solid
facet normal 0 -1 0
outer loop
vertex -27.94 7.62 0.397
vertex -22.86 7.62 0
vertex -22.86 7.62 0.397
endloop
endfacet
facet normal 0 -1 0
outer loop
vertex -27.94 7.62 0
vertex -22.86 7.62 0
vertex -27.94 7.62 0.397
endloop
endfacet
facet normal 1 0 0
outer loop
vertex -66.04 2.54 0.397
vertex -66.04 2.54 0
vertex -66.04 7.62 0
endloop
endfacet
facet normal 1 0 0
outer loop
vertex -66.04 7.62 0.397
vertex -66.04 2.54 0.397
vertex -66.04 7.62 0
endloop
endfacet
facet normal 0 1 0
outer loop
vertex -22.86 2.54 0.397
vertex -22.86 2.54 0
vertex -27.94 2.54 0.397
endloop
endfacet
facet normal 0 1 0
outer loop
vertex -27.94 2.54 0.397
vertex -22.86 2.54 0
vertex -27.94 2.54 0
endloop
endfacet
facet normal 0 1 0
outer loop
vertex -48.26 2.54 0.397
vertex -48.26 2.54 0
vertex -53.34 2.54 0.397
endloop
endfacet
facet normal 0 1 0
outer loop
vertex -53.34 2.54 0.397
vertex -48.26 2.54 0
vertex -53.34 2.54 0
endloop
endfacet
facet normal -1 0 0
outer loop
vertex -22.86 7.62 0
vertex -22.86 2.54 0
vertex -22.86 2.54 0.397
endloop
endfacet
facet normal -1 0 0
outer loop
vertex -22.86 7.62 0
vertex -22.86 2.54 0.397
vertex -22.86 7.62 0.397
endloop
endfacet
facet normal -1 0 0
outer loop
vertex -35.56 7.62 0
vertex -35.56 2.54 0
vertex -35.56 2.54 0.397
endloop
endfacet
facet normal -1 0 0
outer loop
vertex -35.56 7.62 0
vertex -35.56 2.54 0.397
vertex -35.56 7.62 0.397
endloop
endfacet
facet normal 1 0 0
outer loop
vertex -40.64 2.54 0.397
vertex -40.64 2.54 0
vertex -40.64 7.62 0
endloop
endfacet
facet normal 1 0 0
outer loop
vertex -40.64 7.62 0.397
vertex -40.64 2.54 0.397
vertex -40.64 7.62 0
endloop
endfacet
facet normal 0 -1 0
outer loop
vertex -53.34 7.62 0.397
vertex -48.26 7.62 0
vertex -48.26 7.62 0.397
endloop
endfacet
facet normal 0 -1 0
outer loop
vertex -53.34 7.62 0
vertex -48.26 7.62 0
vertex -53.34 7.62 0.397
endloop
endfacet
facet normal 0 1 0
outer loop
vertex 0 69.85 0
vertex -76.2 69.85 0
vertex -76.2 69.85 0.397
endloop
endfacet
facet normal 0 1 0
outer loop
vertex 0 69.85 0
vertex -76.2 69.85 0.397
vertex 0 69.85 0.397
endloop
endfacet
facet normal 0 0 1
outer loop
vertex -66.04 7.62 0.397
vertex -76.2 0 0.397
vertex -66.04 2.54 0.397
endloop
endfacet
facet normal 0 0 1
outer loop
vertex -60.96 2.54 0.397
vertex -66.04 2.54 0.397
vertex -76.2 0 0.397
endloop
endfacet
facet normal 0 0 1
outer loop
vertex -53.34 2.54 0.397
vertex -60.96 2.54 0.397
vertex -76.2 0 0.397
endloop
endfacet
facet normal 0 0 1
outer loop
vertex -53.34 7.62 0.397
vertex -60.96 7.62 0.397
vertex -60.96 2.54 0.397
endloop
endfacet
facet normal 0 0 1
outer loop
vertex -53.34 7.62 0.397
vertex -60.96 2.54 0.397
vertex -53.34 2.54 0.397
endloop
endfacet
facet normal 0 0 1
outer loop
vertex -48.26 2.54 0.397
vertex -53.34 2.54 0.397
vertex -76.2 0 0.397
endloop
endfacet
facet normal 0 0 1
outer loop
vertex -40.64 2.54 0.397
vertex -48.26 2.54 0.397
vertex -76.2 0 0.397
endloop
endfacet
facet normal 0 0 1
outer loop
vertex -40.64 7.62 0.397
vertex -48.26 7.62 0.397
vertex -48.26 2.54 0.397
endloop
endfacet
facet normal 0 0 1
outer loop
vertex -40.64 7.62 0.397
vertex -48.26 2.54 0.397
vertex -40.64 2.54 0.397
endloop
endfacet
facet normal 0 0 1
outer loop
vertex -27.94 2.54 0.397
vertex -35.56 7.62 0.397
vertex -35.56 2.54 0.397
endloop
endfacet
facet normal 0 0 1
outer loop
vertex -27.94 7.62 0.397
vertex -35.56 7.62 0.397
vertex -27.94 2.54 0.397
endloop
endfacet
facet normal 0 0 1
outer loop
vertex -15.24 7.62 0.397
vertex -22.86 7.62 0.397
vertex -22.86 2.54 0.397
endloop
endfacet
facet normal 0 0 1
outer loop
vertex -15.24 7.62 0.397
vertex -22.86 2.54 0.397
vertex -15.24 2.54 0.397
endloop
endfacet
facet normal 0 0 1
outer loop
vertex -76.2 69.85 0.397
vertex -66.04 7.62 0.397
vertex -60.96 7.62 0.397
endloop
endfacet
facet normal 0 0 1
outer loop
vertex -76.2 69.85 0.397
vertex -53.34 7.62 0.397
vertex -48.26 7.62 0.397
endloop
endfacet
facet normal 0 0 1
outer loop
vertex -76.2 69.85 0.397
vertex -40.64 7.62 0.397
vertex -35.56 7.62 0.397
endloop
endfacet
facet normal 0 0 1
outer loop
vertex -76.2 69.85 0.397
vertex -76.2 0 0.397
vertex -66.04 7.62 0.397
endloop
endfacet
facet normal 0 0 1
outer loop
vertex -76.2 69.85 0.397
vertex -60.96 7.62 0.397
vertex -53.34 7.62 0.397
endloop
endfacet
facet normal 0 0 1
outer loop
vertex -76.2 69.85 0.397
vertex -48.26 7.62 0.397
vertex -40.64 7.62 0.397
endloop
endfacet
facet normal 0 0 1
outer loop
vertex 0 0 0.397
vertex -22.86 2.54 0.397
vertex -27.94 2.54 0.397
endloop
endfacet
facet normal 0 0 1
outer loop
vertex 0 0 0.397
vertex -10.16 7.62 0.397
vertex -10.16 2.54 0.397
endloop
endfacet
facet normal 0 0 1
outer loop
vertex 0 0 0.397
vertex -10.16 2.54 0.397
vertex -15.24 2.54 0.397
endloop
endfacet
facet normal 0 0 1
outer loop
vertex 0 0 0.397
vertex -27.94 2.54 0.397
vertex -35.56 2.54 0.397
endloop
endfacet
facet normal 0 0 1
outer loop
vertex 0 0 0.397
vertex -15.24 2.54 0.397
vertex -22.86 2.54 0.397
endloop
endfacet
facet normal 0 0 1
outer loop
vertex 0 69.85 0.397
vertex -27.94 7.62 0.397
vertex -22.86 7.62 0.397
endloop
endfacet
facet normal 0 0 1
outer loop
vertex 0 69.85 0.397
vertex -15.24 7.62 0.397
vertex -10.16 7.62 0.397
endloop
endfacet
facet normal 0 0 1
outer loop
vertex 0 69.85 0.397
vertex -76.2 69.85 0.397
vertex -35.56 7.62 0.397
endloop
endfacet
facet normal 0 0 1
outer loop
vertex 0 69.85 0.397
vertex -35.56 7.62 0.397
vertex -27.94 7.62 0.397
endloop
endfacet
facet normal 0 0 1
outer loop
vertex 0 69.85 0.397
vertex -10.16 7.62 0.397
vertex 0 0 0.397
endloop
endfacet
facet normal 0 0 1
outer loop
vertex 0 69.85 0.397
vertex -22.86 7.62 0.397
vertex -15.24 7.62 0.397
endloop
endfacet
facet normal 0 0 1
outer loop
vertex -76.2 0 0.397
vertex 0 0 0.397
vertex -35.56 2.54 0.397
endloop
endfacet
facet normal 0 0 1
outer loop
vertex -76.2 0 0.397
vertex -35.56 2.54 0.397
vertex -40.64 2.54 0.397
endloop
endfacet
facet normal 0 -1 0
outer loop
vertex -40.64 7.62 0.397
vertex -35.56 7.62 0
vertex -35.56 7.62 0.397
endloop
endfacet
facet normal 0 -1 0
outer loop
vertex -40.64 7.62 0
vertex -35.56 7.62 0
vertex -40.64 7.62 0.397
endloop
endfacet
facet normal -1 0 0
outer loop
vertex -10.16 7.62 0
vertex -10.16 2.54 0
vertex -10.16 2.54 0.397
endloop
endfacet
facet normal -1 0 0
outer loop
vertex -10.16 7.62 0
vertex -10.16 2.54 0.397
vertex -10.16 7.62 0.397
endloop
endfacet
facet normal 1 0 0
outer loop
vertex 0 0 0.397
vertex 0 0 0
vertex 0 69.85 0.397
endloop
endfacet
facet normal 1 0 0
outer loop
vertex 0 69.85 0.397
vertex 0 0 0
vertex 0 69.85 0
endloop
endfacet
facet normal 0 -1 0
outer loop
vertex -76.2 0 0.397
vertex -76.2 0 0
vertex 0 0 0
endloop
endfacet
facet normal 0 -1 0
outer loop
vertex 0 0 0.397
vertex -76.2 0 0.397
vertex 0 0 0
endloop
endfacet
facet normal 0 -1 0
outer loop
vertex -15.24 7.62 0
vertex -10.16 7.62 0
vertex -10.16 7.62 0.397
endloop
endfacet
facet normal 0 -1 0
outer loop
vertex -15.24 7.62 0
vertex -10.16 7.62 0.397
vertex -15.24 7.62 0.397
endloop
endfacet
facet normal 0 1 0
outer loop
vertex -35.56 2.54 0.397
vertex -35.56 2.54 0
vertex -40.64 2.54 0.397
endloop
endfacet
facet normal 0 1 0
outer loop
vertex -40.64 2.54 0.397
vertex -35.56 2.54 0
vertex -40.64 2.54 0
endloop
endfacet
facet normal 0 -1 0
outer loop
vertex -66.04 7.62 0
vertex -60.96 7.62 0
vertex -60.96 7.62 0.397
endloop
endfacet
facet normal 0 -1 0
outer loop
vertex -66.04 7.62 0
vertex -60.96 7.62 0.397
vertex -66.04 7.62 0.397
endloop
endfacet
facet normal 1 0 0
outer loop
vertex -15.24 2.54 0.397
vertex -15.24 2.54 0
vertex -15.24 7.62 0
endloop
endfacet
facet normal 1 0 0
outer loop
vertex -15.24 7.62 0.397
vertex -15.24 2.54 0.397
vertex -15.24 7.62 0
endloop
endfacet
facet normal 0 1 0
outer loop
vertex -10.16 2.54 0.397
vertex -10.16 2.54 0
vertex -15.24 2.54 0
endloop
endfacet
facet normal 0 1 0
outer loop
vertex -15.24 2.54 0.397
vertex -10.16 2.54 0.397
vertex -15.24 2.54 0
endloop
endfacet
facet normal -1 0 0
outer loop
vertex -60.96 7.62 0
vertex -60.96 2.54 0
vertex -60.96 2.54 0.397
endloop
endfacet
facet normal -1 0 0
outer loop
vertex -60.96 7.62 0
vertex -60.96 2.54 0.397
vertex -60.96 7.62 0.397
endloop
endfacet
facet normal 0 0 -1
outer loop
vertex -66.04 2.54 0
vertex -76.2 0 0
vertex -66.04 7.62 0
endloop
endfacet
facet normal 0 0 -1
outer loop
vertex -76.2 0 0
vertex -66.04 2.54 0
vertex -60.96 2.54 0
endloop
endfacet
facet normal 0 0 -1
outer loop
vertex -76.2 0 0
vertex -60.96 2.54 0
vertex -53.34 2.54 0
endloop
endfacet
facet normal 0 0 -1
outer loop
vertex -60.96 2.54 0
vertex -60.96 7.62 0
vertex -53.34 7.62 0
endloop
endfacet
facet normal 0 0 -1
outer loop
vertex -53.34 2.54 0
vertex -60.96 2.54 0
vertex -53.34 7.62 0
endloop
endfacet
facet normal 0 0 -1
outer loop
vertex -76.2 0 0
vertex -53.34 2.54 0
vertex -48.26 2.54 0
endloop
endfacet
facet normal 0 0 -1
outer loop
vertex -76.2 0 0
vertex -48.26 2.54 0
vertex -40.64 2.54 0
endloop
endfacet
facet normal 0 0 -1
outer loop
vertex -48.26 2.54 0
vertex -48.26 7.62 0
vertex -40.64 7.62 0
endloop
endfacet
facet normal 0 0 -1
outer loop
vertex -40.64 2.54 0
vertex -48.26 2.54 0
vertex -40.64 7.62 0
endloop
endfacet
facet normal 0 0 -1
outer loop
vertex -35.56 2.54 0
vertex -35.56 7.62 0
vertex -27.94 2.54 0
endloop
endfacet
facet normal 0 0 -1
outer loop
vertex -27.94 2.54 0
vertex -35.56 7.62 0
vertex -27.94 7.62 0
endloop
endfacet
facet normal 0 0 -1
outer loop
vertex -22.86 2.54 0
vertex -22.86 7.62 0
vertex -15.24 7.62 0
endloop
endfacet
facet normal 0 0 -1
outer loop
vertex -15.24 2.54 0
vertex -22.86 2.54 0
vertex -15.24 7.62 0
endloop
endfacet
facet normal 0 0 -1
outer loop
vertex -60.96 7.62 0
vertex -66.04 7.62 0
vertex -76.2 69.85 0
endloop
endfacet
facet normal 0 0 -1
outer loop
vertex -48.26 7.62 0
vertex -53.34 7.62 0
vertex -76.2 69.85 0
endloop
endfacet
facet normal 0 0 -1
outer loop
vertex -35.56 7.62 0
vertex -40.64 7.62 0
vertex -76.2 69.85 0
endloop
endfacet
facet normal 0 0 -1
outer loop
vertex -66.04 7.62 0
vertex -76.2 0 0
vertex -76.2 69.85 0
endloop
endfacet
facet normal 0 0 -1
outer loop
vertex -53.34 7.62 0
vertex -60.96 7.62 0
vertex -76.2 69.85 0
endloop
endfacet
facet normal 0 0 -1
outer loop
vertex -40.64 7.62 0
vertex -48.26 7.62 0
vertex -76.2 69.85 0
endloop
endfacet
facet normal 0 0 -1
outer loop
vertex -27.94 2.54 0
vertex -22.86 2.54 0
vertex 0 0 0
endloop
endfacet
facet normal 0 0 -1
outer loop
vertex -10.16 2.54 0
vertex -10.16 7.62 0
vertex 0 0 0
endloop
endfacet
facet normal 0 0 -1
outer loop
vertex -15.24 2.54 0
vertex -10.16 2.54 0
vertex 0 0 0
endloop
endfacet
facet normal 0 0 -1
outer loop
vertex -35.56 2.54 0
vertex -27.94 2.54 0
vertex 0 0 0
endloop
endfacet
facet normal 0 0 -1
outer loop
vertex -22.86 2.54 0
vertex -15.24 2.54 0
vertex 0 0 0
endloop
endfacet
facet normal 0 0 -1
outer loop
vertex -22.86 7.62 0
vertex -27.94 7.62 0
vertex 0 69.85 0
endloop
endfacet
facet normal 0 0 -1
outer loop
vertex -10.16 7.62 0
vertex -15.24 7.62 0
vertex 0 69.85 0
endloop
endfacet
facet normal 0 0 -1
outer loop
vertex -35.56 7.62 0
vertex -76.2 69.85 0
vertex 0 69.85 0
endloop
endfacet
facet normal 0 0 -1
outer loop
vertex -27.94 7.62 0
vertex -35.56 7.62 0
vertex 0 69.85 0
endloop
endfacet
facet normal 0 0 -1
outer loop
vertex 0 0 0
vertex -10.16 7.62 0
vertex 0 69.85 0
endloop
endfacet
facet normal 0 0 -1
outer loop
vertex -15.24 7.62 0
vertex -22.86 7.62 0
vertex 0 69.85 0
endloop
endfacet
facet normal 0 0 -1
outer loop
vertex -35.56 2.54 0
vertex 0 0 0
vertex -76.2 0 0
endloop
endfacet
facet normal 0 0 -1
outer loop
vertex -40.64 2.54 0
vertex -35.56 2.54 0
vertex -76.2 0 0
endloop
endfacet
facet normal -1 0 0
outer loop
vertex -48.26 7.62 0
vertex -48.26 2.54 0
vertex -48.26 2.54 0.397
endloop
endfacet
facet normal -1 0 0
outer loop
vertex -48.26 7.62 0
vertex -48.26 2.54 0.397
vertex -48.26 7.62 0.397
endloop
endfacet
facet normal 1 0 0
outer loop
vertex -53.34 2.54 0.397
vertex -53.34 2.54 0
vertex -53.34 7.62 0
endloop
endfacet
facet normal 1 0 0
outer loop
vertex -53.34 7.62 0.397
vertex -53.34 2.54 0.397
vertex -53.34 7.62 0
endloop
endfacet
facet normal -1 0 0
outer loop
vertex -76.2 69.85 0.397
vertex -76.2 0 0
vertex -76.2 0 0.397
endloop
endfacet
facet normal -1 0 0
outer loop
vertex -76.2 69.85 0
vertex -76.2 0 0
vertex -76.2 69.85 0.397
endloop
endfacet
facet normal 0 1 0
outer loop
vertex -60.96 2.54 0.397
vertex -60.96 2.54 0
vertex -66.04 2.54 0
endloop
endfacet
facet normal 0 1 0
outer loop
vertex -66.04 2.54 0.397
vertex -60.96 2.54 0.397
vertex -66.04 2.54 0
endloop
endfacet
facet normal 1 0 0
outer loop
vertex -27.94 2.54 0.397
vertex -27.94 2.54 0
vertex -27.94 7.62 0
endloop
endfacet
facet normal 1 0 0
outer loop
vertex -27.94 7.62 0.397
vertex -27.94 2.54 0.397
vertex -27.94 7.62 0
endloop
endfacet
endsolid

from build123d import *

# Parameters (mm, degrees)
SKETCH1_W           = 76.2
SKETCH1_H           = 69.85
BOSS_EXTRUDE1_DEPTH = 0.396875
SKETCH2_W           = 5.08
SKETCH2_H           = 5.08
CUT_EXTRUDE1_DEPTH  = 1.396875


with BuildPart() as part:
    # Sketch1 → Boss-Extrude1 (new body)
    with BuildSketch(Plane.XY):
        with Locations((-38.1, 34.925)):
            Rectangle(SKETCH1_W, SKETCH1_H)
    extrude(amount=BOSS_EXTRUDE1_DEPTH)

    # Sketch2 → Cut-Extrude1 (cut, through all)
    with BuildSketch(Plane(origin=(0, 0, 0), x_dir=(-1, 0, 0), z_dir=(0, 0, -1))):
        with Locations((63.5, 5.08)):
            Rectangle(SKETCH2_W, SKETCH2_H)
        with Locations((50.8, 5.08)):
            Rectangle(SKETCH2_W, SKETCH2_H)
        with Locations((38.1, 5.08)):
            Rectangle(SKETCH2_W, SKETCH2_H)
        with Locations((25.4, 5.08)):
            Rectangle(SKETCH2_W, SKETCH2_H)
        with Locations((12.7, 5.08)):
            Rectangle(SKETCH2_W, SKETCH2_H)
    extrude(amount=-CUT_EXTRUDE1_DEPTH, mode=Mode.SUBTRACT)


solid = part.part
